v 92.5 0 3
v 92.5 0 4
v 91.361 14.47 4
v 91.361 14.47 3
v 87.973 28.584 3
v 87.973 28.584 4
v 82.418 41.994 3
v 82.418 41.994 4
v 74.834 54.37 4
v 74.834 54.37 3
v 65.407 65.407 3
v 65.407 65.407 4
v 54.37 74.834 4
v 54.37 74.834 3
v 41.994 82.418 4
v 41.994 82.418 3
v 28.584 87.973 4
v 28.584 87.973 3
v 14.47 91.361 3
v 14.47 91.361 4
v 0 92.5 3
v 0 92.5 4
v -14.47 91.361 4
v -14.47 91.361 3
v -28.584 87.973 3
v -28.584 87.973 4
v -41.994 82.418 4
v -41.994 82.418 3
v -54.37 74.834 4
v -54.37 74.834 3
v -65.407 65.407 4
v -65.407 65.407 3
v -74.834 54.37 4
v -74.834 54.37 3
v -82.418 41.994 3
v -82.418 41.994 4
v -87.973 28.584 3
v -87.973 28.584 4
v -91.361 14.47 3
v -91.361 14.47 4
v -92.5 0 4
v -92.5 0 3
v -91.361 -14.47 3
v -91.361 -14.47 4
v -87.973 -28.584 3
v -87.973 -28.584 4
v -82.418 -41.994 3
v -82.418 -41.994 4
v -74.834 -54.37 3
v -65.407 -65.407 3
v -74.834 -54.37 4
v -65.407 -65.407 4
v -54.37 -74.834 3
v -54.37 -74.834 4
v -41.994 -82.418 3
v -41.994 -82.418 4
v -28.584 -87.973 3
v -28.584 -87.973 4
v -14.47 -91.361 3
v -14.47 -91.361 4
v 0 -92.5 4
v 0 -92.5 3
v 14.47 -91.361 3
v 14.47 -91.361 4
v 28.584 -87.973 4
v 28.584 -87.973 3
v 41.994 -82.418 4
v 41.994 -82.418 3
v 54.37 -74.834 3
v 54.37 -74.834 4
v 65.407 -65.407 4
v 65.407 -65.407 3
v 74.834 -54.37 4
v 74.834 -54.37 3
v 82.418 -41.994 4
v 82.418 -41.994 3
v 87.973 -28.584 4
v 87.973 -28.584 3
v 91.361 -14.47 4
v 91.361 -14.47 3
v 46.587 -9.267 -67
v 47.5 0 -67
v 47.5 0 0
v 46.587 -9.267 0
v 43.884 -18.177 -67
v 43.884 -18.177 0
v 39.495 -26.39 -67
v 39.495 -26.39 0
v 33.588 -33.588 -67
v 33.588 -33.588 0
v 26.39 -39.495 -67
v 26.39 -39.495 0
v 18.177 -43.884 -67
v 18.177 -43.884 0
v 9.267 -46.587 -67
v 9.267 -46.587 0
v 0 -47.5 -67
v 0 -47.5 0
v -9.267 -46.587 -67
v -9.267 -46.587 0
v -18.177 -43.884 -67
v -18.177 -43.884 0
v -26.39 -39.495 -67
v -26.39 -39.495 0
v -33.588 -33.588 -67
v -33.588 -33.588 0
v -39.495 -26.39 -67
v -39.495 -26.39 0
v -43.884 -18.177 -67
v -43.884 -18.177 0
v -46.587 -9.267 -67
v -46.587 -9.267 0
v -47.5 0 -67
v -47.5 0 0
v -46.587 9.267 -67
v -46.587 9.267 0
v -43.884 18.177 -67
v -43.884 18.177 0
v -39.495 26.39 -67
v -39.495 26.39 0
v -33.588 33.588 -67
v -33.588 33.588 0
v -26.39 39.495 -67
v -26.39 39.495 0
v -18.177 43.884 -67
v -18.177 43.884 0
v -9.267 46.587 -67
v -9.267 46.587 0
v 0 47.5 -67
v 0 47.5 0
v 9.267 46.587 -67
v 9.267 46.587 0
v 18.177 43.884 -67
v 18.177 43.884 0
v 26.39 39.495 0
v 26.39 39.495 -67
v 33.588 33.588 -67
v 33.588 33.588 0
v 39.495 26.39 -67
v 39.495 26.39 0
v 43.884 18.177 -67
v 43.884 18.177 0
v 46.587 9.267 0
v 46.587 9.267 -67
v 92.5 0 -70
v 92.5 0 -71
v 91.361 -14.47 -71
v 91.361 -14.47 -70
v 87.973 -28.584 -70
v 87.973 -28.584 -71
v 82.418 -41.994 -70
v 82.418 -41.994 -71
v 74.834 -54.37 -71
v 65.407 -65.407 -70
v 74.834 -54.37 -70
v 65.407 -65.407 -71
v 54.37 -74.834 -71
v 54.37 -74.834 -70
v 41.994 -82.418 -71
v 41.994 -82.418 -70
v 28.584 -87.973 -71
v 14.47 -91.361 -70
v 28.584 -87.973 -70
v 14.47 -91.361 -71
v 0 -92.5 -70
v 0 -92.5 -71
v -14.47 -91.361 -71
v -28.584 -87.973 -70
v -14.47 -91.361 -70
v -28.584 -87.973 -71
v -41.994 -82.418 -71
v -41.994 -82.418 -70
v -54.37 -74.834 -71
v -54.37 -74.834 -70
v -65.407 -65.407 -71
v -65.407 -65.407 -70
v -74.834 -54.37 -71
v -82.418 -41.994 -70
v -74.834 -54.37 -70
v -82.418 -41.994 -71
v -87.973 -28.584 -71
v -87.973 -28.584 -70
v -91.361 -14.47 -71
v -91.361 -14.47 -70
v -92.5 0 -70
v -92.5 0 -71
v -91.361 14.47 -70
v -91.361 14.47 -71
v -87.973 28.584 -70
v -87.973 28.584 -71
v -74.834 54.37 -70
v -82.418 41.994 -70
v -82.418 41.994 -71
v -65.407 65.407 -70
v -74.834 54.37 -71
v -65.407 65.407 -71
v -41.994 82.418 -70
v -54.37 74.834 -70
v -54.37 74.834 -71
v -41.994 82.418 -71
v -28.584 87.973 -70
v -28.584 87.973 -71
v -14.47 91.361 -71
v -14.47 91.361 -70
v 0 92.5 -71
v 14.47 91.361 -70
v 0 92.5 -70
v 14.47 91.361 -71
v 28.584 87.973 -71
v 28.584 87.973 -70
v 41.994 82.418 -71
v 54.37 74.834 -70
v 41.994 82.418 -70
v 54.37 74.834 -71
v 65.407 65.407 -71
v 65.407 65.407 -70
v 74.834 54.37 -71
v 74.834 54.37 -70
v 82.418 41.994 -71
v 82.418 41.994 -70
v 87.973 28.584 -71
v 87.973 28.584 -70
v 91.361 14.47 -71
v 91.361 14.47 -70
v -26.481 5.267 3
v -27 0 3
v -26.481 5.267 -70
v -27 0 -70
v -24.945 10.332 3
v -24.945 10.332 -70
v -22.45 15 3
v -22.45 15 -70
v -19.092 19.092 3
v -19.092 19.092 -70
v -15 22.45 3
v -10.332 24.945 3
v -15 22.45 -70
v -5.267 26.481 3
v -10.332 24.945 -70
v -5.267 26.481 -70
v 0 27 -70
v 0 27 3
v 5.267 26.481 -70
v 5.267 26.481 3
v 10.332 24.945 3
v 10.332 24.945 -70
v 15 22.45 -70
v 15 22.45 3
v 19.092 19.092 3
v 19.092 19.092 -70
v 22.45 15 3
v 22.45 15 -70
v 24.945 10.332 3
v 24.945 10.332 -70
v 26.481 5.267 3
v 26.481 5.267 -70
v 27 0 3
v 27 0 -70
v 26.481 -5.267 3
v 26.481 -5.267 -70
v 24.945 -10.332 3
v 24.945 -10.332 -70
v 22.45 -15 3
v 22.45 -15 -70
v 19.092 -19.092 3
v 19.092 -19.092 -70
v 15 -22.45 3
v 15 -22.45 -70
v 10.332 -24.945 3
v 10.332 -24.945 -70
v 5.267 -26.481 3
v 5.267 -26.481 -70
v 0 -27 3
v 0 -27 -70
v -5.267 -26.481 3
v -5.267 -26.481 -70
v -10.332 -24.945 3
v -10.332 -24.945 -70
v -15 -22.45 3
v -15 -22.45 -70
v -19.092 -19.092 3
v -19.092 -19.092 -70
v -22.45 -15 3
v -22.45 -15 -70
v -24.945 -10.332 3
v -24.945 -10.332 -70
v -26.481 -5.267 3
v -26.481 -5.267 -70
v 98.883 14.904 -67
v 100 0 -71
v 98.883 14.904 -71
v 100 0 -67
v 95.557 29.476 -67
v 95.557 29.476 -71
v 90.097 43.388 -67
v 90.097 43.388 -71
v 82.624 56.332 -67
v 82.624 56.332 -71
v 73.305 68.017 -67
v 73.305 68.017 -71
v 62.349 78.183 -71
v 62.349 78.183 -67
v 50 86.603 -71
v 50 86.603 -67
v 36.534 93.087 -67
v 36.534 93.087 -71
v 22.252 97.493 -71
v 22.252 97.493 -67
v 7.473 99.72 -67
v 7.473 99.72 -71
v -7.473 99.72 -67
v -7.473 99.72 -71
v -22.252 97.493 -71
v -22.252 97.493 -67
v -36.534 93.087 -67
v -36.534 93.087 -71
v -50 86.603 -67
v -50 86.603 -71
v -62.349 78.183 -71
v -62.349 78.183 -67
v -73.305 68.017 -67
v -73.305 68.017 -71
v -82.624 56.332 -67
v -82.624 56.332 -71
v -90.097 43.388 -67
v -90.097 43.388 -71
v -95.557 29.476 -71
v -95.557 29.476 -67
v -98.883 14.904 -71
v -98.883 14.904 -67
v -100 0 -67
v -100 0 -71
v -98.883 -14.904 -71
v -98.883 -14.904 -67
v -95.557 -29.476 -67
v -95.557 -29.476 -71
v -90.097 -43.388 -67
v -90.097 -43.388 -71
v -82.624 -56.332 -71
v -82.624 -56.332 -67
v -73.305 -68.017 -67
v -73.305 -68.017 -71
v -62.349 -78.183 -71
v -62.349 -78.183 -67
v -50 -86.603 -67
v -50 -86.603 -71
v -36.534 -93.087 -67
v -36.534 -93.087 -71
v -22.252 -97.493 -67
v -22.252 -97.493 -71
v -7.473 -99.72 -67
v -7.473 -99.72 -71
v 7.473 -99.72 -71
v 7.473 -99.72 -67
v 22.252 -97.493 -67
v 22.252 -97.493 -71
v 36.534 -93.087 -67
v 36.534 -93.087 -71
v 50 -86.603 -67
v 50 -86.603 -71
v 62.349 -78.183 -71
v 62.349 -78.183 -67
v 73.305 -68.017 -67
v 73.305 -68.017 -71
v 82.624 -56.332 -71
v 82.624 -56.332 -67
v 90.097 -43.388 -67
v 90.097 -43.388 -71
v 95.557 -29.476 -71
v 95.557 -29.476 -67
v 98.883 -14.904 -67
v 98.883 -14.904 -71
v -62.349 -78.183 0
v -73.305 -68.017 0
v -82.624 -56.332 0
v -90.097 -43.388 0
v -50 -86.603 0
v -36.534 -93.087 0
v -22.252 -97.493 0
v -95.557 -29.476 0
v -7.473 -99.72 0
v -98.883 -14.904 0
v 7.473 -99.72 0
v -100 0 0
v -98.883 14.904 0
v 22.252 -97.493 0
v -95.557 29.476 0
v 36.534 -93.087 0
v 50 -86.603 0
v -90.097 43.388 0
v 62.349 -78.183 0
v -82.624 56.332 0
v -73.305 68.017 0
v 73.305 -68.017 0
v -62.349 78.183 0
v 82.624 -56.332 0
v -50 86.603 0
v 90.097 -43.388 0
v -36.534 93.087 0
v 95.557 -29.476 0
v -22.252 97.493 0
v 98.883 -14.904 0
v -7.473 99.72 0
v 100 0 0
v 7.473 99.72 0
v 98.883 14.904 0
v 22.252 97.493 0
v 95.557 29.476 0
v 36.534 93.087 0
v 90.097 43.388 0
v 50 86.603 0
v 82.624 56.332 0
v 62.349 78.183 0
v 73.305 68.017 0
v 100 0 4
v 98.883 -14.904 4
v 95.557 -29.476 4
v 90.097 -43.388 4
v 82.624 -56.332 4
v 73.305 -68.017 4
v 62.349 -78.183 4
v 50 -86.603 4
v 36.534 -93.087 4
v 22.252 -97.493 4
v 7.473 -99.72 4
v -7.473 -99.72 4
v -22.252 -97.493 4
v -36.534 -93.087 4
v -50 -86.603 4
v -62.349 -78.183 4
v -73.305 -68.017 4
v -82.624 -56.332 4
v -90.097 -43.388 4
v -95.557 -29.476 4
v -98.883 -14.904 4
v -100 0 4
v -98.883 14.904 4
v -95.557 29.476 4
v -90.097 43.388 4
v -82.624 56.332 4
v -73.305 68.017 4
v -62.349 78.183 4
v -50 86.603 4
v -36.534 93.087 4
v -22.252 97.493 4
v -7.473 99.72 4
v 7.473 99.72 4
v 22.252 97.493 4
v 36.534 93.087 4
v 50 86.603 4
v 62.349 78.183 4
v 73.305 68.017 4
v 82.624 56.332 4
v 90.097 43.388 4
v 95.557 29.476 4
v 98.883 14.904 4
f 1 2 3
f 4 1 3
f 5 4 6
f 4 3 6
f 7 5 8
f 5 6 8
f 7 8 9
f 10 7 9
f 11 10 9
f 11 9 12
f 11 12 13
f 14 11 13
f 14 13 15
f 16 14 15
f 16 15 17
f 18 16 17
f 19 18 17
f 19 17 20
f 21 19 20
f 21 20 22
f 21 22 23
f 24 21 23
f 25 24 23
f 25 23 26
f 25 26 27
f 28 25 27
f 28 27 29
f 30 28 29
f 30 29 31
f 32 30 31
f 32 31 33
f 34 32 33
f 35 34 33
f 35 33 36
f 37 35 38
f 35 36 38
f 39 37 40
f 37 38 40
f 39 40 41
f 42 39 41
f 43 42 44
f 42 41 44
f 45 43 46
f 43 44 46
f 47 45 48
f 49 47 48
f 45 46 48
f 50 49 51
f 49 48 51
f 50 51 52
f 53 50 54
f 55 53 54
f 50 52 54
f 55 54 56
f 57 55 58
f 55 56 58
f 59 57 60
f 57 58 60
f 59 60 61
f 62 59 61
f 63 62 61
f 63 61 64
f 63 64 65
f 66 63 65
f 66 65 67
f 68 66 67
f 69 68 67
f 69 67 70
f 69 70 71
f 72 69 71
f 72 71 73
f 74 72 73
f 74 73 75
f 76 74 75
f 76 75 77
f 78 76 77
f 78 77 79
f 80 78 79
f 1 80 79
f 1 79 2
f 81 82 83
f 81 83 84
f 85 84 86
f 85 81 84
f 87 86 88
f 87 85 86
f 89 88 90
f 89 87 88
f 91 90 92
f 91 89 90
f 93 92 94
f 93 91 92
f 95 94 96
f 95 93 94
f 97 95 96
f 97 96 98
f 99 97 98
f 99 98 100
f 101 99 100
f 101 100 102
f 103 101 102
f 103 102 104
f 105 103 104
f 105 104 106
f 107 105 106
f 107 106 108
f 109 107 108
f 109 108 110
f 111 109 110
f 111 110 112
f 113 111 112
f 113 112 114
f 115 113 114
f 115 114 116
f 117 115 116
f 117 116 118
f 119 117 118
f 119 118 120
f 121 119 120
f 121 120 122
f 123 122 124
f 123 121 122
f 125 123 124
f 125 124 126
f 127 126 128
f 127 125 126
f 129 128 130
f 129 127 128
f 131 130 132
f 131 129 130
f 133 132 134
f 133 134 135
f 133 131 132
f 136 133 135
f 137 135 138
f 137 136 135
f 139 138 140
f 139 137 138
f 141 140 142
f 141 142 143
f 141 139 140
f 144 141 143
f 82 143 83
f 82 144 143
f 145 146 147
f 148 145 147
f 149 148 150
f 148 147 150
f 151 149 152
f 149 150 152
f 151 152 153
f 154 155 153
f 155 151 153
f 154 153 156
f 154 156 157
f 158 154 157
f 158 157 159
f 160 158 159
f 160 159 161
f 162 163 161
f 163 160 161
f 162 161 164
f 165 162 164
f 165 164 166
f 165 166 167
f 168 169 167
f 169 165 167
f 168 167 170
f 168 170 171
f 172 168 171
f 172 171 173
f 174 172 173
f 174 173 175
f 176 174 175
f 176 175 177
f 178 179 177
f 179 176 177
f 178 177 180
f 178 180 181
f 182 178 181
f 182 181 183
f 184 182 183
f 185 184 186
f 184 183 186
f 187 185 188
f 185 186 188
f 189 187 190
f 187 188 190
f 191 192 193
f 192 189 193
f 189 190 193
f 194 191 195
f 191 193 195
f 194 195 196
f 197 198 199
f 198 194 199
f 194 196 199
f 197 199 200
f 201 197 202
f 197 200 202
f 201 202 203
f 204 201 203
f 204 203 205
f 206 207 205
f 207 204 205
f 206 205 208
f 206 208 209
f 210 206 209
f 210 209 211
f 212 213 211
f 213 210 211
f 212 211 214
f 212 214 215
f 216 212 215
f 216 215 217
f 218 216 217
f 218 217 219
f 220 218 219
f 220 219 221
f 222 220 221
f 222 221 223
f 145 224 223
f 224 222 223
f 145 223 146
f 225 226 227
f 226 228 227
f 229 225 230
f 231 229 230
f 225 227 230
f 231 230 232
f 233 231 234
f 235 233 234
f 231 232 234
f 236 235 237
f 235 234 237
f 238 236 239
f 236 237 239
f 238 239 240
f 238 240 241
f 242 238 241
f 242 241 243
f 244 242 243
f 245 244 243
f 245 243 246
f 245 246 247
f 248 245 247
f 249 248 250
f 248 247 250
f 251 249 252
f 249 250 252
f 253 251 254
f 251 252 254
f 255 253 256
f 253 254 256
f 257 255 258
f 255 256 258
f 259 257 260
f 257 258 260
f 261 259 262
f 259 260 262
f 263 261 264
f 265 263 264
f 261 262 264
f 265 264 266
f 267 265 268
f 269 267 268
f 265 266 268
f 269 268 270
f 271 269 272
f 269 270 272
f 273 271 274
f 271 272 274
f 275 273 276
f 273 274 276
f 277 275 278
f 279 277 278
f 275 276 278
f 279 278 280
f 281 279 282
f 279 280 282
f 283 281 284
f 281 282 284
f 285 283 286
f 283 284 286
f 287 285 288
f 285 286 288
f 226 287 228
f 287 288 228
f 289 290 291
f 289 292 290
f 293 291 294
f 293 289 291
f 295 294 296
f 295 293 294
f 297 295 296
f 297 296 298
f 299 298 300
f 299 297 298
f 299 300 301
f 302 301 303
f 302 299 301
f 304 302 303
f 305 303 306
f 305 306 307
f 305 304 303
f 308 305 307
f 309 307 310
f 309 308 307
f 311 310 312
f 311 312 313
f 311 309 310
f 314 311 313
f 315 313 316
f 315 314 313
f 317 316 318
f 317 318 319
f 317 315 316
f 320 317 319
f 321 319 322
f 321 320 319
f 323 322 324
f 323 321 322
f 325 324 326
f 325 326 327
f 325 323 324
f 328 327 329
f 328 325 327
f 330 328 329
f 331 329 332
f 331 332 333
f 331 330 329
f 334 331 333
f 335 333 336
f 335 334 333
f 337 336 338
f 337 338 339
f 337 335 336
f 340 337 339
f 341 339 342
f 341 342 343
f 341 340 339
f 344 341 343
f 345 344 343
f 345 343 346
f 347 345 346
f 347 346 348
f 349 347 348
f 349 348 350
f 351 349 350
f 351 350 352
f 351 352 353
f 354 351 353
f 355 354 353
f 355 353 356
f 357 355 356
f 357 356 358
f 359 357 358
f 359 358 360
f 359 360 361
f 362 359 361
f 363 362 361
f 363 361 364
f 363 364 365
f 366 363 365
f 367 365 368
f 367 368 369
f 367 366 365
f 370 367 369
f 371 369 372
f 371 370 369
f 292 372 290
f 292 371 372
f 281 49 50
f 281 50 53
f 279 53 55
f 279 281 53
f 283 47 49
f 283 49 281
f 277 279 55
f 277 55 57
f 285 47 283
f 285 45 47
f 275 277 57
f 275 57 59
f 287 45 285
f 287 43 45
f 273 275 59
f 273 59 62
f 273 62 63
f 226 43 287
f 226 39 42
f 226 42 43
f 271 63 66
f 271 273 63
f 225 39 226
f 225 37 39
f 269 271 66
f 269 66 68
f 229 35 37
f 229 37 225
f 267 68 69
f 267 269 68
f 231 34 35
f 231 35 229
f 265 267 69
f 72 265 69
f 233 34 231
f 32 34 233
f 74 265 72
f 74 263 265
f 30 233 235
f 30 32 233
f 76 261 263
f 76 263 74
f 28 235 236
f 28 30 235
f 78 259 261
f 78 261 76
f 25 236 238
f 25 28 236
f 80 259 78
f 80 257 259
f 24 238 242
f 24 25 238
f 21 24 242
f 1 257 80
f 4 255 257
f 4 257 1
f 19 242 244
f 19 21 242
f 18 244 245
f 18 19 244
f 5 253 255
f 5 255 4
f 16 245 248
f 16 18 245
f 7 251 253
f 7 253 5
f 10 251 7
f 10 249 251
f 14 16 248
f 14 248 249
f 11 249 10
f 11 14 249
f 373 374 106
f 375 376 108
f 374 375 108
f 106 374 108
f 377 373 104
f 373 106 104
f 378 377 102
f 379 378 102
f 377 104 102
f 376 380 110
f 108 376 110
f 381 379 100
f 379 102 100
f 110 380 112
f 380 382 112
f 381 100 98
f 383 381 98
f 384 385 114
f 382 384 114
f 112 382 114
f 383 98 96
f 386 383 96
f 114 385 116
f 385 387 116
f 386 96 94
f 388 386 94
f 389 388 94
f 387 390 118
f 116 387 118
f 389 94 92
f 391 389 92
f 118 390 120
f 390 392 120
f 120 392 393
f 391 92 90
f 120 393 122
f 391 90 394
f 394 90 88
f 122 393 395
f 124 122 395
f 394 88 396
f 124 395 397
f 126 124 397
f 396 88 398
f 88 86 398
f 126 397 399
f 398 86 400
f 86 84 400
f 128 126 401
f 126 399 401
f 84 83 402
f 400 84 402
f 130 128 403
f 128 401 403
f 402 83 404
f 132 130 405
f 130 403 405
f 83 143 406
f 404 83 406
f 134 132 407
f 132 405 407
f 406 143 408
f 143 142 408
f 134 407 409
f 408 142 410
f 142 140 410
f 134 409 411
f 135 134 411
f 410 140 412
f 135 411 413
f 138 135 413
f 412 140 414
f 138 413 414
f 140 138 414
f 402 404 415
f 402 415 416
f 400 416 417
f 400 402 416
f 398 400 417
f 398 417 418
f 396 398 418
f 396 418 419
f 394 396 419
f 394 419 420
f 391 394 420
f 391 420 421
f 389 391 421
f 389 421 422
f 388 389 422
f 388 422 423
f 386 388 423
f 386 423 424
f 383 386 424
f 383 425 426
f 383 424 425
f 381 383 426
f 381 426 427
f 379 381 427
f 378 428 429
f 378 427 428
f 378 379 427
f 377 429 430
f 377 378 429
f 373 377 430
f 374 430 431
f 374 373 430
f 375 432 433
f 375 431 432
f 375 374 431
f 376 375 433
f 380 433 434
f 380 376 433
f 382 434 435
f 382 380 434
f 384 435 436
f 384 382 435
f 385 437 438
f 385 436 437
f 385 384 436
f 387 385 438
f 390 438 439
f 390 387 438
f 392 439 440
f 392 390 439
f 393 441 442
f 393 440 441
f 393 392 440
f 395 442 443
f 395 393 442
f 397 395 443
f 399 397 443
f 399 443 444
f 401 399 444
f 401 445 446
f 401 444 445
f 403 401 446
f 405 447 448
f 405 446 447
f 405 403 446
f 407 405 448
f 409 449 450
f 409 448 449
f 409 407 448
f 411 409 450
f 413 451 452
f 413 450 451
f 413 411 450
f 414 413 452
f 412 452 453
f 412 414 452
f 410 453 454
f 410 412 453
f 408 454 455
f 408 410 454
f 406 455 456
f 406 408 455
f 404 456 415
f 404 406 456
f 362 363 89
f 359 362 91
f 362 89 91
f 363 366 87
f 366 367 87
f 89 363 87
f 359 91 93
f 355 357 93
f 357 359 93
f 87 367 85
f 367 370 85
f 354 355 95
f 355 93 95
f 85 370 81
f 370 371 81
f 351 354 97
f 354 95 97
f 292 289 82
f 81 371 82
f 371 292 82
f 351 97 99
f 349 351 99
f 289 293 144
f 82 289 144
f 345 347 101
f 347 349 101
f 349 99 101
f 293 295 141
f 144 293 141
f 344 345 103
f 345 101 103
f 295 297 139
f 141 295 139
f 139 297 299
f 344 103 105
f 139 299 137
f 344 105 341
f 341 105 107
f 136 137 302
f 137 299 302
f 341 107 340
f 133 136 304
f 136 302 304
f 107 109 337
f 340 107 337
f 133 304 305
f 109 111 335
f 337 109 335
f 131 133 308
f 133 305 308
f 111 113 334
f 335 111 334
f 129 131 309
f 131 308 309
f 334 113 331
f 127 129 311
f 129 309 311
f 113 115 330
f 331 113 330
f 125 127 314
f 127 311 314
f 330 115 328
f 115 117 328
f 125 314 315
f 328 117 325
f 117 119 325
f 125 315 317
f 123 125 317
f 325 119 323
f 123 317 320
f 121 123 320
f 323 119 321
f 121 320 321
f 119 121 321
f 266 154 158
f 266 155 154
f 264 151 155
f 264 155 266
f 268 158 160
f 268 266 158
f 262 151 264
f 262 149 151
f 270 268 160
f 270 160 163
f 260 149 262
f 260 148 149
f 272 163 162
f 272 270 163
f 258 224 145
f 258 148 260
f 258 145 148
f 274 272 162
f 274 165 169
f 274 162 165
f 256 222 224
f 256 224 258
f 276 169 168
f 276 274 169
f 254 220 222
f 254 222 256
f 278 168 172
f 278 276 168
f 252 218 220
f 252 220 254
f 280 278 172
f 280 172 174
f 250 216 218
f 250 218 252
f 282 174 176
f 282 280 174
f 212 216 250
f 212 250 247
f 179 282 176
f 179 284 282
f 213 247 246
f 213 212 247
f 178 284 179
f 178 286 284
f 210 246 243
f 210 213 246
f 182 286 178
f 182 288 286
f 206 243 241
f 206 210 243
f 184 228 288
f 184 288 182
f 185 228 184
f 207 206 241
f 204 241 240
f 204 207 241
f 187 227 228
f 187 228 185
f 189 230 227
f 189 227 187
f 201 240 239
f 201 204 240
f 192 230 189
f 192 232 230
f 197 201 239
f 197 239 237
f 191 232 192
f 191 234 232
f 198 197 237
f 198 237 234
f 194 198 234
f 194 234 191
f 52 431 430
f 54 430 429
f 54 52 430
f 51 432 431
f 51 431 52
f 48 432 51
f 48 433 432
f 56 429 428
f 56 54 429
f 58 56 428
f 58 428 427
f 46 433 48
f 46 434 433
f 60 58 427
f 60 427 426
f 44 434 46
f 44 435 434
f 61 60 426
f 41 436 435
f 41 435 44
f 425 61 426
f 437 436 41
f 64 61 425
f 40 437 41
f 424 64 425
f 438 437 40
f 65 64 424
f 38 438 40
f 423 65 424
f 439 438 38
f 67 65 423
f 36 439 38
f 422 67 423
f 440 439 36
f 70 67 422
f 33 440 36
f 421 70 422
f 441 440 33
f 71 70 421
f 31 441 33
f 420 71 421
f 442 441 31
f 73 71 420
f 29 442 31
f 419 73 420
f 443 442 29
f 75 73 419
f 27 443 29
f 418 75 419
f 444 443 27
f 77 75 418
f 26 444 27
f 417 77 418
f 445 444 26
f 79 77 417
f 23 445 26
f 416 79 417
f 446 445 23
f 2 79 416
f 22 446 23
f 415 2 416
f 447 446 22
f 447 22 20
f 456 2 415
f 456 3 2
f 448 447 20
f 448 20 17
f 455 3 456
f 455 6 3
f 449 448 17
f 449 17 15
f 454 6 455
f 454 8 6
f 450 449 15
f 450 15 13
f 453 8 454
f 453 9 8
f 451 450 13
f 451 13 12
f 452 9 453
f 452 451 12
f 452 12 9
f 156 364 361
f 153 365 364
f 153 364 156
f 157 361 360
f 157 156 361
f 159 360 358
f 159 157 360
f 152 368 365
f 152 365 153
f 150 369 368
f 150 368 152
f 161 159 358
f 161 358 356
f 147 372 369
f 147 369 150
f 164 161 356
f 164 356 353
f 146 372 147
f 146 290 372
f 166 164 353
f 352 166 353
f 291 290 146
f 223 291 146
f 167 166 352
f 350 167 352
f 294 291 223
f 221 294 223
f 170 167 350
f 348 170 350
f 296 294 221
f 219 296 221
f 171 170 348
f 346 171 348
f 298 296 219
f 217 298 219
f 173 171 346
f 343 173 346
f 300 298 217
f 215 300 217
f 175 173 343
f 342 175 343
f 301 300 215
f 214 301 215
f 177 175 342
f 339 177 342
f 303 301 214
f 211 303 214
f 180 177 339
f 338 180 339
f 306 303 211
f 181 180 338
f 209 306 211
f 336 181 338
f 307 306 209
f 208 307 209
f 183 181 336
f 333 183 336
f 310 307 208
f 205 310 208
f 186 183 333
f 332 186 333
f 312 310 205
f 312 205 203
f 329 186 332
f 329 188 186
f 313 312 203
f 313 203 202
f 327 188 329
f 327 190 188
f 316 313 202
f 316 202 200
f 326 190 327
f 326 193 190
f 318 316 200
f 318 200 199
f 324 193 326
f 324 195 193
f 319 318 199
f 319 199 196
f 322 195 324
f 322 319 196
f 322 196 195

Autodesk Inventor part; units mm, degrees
ref_plane "YZ Plane" through (0, 0, 0) normal (1, 0, 0) x (0, 1, 0)
ref_plane "XZ Plane" through (0, 0, 0) normal (0, 1, 0) x (-1, 0, 0)
sketch "Sketch11" plane through (0, 0, 0) normal (0, 0, 1) x (1, 0, 0)
  circle A0 centre (0, 0) radius 100
  dimension "d39" = 200
extrude "Extrusion10" add sketch "Sketch11" along normal blind 4
sketch "Sketch12" plane through (0, 0, 4) normal (0, 0, 1) x (1, 0, 0)
  circle A0 centre (0, 0) radius 100 projected
  circle A1 centre (0, 0) radius 92.5
  dimension "d42" = 185
extrude "Extrusion11" cut sketch "Sketch12" against normal blind 1 contours A1
ref_plane "Work Plane1" through (0, 0, -33.5) normal (0, 0, -1) x (-1, 0, 0)
mirror "Mirror1" about plane through (0, 0, -33.5) normal (0, 0, -1)
sketch "Sketch14" plane through (0, 0, -67) normal (0, 0, 1) x (1, 0, 0)
  circle A0 centre (0, 0) radius 100 projected
  circle A1 centre (0, 0) radius 47.5
  dimension "d46" = 95
extrude "Extrusion12" add sketch "Sketch14" along normal up to next contours A1
sketch "Sketch15" plane through (0, 0, -70) normal (0, 0, -1) x (-1, 0, 0)
  circle A0 centre (0, 0) radius 92.5 projected
  circle A1 centre (0, 0) radius 27
  dimension "d50" = 54
extrude "Extrusion13" cut sketch "Sketch15" against normal up to surface (73 mm away) contours A1
properties part number "SpoolFilament" material "ABS Plastic"
